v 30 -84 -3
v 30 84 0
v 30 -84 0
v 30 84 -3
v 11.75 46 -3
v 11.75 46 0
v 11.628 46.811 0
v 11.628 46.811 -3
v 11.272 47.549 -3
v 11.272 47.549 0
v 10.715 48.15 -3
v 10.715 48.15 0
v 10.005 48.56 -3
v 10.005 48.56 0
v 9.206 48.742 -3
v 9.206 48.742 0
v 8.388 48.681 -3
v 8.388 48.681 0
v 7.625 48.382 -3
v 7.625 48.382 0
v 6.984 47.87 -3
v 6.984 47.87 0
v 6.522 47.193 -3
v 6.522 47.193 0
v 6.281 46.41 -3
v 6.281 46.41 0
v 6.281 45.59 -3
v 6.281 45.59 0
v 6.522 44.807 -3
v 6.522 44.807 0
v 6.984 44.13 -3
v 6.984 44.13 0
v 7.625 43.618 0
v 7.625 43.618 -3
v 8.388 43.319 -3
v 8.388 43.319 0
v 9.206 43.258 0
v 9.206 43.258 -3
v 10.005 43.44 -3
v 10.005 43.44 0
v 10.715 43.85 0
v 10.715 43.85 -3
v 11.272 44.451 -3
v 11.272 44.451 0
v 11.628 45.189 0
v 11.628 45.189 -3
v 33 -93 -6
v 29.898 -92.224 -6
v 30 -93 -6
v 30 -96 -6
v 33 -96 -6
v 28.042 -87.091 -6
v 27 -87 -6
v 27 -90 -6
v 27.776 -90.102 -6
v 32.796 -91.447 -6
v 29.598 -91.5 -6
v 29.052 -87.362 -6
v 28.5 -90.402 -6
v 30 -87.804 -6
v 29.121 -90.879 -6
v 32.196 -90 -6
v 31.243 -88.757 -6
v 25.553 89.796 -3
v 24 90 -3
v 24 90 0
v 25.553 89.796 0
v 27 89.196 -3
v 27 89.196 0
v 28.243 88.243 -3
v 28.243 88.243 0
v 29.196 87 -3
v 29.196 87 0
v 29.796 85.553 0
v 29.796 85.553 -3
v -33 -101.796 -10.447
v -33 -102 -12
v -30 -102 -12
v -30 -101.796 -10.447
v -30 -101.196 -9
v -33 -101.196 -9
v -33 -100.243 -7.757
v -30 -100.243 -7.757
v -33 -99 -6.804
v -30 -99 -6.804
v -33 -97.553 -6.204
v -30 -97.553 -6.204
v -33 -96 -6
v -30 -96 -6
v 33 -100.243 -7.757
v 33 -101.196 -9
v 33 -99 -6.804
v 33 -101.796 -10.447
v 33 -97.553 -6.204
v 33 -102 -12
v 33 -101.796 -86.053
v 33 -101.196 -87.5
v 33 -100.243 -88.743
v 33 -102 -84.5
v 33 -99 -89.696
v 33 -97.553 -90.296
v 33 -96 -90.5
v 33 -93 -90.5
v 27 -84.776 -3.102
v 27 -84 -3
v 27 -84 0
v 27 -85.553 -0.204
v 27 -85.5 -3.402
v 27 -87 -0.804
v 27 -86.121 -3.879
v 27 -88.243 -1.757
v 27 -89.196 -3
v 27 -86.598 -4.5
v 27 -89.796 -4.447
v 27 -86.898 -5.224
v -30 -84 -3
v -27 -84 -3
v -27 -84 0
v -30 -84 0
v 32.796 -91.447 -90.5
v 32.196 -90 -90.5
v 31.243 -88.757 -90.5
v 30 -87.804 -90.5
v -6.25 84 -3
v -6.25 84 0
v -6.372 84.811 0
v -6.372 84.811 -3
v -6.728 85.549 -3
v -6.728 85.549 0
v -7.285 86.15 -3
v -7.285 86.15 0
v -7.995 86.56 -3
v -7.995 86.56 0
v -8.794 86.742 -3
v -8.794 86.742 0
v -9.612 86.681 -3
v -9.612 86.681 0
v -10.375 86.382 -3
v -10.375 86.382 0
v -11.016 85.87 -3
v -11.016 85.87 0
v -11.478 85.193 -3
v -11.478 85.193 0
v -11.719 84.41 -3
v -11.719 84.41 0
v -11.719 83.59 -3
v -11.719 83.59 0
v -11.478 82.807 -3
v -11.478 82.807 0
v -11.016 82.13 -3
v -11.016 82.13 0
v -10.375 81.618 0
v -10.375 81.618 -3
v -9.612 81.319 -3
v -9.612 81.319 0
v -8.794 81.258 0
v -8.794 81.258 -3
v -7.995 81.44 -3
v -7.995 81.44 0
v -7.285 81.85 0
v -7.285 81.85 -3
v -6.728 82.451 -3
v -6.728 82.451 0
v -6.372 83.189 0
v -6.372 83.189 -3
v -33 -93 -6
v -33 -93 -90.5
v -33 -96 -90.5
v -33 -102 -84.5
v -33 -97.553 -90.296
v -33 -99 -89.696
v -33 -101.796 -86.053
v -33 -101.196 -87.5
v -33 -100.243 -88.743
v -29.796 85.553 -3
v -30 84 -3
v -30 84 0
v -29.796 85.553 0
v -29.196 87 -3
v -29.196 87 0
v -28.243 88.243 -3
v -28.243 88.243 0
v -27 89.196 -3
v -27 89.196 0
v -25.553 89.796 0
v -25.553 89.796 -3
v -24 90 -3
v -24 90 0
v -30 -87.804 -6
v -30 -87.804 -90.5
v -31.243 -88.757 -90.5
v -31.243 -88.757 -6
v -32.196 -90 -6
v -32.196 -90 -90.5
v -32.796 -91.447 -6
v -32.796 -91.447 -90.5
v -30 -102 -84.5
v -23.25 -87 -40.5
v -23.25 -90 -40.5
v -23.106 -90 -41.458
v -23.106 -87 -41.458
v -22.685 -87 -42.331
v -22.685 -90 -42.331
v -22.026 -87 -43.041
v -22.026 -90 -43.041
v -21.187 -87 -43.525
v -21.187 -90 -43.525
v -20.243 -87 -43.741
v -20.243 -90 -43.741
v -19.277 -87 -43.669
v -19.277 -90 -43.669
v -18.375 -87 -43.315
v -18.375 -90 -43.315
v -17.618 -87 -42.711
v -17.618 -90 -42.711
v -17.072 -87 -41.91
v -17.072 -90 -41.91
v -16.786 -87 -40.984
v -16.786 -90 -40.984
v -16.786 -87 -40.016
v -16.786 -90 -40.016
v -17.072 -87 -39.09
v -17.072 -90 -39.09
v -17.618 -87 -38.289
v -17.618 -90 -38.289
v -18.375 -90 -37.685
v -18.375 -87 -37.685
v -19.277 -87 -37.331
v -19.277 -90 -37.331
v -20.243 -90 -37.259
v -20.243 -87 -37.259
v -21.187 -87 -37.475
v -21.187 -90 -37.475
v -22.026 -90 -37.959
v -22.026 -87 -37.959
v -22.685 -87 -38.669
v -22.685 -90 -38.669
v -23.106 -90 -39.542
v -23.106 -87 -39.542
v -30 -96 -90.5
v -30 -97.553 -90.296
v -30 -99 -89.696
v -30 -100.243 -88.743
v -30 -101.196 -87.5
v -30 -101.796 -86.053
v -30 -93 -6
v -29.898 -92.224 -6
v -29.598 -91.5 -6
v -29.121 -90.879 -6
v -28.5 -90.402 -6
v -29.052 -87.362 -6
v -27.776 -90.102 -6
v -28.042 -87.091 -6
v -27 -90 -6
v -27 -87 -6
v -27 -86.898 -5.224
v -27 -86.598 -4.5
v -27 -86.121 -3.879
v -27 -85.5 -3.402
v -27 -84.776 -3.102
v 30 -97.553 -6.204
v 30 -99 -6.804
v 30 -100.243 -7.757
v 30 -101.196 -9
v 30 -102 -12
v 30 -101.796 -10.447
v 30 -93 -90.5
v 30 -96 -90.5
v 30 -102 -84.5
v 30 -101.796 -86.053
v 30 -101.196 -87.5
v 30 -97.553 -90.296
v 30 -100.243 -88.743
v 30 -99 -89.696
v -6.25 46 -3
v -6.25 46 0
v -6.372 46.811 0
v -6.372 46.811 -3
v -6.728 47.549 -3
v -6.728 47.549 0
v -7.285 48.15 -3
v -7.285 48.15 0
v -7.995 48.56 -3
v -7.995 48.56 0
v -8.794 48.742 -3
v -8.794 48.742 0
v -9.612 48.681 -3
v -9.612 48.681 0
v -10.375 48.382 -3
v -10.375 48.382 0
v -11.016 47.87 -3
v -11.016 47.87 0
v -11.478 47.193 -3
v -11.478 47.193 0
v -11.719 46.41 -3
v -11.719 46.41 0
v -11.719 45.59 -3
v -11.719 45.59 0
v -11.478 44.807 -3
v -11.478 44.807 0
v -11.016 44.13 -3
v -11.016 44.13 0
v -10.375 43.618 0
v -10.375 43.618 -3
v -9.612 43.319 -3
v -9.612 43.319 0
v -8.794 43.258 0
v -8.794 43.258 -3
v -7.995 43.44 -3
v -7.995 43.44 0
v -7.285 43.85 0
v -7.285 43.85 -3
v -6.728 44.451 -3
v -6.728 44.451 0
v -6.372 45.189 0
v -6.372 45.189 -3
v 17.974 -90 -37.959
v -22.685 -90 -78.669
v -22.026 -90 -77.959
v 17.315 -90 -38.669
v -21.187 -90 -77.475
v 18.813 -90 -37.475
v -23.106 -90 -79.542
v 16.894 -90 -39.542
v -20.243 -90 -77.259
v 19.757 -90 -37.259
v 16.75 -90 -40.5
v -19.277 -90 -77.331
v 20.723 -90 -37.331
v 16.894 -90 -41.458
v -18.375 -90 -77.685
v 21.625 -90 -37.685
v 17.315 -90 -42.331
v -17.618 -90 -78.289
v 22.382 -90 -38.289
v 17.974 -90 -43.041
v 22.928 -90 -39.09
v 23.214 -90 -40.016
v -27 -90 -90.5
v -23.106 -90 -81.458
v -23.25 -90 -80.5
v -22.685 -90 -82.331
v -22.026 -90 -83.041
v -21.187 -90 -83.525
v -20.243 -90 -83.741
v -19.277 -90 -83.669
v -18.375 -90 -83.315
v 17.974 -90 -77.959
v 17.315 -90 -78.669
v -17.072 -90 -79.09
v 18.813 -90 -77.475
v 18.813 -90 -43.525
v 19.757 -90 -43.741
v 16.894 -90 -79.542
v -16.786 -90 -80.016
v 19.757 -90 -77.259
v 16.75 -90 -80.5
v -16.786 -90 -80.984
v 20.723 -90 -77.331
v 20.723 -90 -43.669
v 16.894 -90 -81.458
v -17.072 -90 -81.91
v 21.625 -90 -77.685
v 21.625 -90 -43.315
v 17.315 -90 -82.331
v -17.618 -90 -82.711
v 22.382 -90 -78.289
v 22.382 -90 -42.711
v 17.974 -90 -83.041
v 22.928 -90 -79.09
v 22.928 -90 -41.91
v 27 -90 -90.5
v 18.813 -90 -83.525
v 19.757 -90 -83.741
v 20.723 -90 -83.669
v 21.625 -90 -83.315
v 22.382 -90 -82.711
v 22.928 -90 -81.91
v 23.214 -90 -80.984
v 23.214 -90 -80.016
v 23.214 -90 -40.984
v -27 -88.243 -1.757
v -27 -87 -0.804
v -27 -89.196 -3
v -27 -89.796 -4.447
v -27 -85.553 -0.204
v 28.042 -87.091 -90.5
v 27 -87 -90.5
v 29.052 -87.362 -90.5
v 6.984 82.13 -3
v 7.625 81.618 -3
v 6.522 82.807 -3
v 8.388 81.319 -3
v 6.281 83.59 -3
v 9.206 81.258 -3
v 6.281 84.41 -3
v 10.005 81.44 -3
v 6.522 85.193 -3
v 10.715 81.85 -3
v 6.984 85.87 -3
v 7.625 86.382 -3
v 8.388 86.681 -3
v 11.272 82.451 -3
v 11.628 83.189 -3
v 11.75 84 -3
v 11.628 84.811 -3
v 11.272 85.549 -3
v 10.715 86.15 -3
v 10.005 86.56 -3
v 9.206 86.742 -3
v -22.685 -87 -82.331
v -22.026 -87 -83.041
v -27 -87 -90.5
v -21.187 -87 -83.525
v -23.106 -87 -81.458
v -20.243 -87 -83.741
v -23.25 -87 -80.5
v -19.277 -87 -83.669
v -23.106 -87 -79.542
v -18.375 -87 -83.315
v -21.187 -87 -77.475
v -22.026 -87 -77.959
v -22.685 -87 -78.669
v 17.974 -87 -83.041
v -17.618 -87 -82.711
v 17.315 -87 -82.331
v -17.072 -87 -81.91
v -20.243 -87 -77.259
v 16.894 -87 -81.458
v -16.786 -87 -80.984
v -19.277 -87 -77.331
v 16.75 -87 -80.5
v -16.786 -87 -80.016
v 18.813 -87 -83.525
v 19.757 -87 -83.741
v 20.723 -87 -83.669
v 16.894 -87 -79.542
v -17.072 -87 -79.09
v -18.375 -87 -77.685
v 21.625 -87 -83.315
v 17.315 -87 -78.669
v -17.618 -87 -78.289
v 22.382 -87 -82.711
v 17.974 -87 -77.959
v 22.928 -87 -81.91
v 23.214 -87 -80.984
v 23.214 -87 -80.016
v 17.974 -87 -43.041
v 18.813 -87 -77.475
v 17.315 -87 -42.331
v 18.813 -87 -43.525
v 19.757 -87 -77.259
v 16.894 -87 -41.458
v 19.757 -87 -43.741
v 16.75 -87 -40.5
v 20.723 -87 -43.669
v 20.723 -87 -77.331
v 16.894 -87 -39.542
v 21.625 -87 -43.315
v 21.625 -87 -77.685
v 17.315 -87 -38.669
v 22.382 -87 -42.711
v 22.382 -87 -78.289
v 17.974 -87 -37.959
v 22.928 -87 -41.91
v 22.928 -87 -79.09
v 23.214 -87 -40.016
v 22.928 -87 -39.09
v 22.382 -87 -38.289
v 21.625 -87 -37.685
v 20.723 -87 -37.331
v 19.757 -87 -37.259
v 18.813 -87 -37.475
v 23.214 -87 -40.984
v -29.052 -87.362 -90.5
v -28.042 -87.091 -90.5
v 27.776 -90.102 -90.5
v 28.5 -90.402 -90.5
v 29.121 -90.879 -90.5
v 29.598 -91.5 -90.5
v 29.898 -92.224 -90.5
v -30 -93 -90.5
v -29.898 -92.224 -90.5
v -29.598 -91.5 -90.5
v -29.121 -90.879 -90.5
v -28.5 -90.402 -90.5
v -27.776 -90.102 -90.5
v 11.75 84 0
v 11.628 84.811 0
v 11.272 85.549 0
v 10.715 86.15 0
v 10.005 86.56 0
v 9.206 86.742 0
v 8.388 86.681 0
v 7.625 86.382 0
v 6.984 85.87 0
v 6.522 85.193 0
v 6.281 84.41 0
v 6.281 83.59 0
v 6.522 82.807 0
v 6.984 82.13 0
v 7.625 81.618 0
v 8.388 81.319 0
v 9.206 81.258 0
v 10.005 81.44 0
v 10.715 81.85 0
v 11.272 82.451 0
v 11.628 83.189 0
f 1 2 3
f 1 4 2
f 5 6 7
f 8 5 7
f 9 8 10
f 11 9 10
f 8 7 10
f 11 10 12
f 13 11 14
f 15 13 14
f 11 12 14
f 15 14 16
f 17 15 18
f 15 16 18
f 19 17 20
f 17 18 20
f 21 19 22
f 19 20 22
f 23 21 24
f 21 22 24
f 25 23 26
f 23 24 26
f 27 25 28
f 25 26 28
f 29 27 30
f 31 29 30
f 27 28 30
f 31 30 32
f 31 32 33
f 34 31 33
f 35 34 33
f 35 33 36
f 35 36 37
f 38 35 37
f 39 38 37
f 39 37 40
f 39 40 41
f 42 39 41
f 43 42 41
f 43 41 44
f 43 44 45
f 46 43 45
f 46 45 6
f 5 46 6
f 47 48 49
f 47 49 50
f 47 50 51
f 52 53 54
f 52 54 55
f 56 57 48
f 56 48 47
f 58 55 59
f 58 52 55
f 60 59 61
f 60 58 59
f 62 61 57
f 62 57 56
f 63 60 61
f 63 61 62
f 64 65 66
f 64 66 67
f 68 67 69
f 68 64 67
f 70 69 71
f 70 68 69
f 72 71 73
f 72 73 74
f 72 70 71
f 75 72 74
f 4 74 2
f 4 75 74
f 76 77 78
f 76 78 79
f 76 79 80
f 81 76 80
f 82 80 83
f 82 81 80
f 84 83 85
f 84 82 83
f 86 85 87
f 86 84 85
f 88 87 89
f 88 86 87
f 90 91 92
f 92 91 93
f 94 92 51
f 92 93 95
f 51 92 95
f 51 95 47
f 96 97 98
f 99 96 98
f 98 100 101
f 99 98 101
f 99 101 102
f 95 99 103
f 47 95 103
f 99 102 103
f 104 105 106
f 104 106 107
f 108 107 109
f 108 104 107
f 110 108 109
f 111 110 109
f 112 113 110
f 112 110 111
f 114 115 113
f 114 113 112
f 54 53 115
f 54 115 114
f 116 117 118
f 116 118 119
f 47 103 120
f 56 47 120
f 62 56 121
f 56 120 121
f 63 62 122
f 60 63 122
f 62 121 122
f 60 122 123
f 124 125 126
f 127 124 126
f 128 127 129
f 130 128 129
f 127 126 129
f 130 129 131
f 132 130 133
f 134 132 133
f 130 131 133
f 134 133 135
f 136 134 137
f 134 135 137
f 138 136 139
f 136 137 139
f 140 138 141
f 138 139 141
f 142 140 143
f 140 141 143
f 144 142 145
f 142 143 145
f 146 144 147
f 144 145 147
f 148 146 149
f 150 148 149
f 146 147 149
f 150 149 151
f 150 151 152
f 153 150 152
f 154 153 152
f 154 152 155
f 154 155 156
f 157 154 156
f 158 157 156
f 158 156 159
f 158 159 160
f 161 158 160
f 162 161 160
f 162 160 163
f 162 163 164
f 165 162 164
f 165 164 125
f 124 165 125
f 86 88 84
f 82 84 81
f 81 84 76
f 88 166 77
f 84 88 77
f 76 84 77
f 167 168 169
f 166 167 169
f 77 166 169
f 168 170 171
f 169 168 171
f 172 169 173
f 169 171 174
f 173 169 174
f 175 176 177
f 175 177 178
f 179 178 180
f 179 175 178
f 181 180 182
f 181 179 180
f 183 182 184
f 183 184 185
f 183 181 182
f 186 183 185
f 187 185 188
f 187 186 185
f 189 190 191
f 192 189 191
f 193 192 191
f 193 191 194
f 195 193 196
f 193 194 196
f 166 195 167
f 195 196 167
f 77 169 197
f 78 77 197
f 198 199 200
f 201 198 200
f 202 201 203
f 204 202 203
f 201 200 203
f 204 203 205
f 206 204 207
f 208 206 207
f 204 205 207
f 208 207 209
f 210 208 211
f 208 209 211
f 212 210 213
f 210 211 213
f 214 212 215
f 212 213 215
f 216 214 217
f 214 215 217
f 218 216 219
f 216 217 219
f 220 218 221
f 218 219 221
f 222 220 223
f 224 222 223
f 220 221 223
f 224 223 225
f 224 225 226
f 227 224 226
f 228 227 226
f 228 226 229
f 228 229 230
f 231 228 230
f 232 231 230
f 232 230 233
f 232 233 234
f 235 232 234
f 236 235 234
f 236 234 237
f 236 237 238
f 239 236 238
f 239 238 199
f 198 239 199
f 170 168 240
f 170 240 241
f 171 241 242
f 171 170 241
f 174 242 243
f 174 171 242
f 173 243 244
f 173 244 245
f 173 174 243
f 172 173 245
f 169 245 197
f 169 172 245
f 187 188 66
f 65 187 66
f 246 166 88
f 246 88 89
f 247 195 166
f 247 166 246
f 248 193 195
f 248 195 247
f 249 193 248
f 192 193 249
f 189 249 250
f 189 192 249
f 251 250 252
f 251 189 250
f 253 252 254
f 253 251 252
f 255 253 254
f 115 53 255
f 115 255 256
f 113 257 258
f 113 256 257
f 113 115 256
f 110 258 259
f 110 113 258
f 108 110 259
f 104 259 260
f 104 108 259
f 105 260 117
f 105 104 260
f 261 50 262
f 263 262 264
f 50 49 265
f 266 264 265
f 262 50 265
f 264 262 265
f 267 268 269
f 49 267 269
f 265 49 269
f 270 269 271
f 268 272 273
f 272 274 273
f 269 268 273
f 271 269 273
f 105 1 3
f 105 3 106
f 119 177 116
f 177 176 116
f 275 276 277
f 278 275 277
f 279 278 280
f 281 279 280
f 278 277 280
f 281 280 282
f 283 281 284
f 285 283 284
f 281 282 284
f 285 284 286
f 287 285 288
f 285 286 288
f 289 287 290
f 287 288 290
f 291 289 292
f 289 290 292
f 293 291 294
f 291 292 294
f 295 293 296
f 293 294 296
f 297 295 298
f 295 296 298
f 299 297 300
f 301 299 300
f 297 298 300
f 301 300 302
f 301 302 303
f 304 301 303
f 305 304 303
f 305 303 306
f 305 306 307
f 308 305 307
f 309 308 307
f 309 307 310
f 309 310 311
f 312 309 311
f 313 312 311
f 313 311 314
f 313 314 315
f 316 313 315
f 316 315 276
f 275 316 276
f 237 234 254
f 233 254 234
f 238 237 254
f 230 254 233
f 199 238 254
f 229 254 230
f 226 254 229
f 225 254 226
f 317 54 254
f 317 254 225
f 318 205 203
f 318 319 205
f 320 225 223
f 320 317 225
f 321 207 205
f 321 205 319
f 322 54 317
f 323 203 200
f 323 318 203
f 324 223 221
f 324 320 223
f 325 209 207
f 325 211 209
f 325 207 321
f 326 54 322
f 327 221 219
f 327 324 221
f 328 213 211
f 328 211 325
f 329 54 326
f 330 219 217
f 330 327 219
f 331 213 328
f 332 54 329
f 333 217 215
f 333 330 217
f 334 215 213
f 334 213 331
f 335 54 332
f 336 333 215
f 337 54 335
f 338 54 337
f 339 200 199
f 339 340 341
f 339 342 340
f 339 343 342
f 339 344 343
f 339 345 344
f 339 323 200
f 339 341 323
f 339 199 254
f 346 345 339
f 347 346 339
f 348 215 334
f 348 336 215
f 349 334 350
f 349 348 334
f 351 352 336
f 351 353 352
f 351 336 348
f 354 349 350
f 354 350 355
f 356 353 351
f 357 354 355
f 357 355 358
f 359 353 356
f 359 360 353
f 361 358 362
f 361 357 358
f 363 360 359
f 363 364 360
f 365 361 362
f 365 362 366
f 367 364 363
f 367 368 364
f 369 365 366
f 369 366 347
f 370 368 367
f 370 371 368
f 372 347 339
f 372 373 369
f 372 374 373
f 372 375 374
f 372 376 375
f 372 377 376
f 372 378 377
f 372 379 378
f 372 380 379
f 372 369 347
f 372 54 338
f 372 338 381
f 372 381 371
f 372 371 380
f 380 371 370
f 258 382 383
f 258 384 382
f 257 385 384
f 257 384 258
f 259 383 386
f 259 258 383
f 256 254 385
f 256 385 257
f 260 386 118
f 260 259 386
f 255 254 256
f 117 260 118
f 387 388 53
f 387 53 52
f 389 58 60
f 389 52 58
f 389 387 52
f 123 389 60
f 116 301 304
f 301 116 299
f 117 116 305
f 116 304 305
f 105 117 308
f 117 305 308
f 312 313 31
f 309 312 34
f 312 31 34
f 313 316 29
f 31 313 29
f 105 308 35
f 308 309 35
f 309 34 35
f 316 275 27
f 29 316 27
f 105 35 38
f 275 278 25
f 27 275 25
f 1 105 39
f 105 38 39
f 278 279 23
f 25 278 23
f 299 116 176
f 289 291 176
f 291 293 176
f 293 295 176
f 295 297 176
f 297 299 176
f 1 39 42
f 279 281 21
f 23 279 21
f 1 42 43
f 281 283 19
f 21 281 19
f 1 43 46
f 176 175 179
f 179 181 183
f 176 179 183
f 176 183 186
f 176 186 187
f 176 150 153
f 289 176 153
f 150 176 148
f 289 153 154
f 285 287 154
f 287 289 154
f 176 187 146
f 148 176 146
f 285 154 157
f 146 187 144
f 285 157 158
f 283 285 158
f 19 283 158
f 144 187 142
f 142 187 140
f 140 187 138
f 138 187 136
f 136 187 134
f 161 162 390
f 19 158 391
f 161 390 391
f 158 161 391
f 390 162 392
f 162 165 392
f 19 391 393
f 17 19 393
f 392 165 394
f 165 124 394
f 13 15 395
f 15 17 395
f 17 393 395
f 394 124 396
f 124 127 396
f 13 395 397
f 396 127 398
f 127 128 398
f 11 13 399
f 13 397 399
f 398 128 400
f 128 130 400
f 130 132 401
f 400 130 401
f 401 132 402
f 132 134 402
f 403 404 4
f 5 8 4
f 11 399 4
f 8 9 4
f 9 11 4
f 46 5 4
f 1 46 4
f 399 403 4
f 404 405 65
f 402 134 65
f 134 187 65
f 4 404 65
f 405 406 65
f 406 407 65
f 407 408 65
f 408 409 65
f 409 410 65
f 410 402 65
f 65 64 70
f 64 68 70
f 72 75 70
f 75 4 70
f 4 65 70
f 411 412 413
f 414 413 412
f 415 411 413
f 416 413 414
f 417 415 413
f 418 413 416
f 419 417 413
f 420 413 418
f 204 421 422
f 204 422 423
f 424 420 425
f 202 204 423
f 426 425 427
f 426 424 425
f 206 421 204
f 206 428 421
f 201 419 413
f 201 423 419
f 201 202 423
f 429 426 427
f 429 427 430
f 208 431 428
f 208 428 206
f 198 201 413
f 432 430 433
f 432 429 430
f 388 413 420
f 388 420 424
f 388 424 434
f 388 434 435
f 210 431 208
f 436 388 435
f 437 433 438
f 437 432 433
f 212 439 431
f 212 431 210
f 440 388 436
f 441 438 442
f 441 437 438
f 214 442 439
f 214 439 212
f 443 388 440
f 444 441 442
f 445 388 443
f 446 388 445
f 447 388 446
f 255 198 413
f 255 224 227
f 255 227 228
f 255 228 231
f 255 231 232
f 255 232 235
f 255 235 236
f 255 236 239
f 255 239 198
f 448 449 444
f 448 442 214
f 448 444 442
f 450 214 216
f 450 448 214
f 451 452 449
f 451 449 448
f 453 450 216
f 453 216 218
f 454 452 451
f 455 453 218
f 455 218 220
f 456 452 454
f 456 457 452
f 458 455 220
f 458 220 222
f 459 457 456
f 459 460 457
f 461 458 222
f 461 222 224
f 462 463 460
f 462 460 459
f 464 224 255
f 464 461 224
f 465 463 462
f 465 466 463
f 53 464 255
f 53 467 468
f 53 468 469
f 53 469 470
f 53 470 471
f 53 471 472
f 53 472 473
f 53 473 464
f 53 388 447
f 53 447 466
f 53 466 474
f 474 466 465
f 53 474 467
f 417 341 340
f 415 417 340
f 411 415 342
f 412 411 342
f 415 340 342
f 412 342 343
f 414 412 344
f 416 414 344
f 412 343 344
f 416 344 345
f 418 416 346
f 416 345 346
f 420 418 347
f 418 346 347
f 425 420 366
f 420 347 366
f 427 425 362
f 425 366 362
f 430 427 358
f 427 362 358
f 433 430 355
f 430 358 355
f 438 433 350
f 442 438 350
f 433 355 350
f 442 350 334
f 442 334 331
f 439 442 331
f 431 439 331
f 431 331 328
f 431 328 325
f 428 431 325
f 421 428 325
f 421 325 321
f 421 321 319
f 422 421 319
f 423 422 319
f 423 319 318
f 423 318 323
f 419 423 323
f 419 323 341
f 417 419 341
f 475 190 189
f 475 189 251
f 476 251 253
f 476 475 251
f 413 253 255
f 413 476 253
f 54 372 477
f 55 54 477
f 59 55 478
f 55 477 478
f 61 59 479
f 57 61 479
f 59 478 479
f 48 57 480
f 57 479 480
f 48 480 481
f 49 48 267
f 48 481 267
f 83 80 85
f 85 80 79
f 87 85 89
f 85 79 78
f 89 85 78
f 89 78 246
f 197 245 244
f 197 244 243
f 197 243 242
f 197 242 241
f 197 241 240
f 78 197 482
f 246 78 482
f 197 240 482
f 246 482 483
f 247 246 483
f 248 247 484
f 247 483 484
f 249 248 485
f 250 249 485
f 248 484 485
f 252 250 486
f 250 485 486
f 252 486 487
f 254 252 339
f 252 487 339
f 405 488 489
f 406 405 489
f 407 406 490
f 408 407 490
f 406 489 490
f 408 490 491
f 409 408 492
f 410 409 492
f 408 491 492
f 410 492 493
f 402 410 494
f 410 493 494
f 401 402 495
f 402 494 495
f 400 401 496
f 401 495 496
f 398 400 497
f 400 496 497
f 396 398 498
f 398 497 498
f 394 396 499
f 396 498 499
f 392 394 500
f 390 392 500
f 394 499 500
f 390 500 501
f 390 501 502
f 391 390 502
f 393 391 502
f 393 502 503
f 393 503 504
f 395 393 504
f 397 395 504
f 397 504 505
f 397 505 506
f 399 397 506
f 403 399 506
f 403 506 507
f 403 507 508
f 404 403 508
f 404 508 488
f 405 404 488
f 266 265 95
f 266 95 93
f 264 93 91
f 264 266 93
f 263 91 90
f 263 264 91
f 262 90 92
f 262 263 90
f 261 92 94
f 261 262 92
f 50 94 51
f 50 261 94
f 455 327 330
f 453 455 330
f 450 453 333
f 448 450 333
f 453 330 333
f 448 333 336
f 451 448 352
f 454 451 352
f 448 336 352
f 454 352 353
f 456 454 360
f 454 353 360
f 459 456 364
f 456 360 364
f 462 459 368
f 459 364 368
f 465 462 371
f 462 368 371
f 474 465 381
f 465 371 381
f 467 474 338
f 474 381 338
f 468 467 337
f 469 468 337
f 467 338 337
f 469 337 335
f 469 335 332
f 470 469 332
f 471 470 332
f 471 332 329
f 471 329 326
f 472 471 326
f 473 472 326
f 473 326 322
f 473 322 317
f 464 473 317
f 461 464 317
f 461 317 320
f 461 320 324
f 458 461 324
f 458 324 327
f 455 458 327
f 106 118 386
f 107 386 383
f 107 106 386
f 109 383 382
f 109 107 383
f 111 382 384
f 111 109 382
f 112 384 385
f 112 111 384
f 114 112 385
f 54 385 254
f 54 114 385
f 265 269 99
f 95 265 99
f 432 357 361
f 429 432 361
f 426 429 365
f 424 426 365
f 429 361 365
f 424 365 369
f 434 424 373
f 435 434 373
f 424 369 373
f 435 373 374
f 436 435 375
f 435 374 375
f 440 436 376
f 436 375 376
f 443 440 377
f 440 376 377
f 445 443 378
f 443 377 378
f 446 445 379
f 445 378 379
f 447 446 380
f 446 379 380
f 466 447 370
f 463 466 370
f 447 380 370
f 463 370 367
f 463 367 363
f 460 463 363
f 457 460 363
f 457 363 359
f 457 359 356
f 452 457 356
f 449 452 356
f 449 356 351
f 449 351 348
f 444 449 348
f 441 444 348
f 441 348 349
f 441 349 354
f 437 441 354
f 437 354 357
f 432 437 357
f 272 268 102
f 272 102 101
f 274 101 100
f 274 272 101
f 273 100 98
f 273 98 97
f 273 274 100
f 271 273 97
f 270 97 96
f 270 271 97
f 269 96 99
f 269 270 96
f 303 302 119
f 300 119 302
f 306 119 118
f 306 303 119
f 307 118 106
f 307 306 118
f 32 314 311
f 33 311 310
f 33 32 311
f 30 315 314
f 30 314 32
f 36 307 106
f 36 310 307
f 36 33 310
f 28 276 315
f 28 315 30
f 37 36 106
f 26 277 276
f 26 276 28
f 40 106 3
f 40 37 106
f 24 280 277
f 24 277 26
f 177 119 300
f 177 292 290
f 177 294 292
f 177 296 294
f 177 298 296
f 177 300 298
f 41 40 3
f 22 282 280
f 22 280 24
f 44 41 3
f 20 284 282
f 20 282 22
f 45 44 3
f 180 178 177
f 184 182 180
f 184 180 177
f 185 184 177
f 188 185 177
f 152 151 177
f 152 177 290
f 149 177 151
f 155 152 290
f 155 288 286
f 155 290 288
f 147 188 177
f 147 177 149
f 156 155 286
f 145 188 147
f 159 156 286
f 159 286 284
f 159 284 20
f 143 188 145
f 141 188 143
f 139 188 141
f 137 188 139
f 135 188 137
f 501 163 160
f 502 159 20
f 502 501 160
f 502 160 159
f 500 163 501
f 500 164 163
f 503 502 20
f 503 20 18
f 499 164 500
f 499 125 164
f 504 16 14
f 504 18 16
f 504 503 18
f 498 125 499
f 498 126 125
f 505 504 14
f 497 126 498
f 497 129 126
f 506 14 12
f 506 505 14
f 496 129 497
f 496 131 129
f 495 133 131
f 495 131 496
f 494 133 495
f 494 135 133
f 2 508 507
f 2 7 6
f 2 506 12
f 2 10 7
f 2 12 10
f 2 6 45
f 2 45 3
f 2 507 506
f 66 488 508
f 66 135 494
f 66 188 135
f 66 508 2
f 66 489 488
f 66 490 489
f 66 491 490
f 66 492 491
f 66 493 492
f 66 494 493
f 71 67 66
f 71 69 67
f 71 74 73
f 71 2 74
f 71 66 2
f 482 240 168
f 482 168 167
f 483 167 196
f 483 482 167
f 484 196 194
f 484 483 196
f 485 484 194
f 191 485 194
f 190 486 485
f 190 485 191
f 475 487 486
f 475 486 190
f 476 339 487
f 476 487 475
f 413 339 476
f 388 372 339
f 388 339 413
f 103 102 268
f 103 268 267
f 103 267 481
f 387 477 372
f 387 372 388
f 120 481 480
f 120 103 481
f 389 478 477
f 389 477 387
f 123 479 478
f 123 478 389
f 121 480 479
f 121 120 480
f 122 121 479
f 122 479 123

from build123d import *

# Parameters (mm, degrees)
SKIZZE1_W                        = 60
SKIZZE1_H                        = 180
BASIS_BLECH1_DEPTH               = 3
KANTE_LASCHE1_STRIP_W            = 18
KANTE_LASCHE1_STRIP_H            = 3
KANTE_LASCHE1_STRIP_CUT_DEPTH    = 60
KANTE_LASCHE1_DEPTH              = 60
KANTE_LASCHE2_START              = -90.5
KANTE_LASCHE2_DEPTH              = 90.5
KANTE_LASCHE2_START_2            = -6
KANTE_LASCHE2_2_DEPTH            = 6
KANTE_LASCHE2_3_DEPTH            = 84.5
ECKE_START                       = -33
ECKE_BRECHEN1_DEPTH              = 66
ECKE_START_2                     = -3
ECKE_BRECHEN1_2_DEPTH            = 3
F_6_5_6_5_DURCHMESSER_BOHRUNG1_D = 6.5
F_5_5_5_5_DURCHMESSER_BOHRUNG1_D = 5.5


# Read off the part's stored shape, not the designer's step: Kante-Lasche2, Ecke brechen1
# Sheet-metal steps are written as plain solids
with BuildPart() as part:
    # Skizze1 → Basis-Blech1 (new body)
    with BuildSketch(Plane.XY):
        Rectangle(SKIZZE1_W, SKIZZE1_H)
    extrude(amount=-BASIS_BLECH1_DEPTH)

    # Kante-Lasche1 strip (across the edge) → Kante-Lasche1 strip cut (cut)
    with BuildSketch(Plane(origin=(30, -90, -3), x_dir=(0, 1, 0), z_dir=(-1, 0, 0))):
        with Locations((-3, -1.5)):
            Rectangle(KANTE_LASCHE1_STRIP_W, KANTE_LASCHE1_STRIP_H)
    extrude(amount=KANTE_LASCHE1_STRIP_CUT_DEPTH, mode=Mode.SUBTRACT)

    # Kante-Lasche1 section (across the edge) → Kante-Lasche1 (add)
    with BuildSketch(Plane(origin=(30, -90, -3), x_dir=(0, 1, 0), z_dir=(-1, 0, 0))):
        with BuildLine():
            Line((0, 3), (0, 87.5))
            Line((0, 87.5), (3, 87.5))
            Line((3, 87.5), (3, 3))
            ThreePointArc((3, 3), (3.878679656, 0.878679656), (6, 0))
            Line((6, 0), (6, -3))
            ThreePointArc((6, -3), (1.757359313, -1.242640687), (0, 3))
        make_face()
    extrude(amount=KANTE_LASCHE1_DEPTH)

    # Kante-Lasche2 outline → Kante-Lasche2 (cut)
    with BuildSketch(Plane.XY.offset(KANTE_LASCHE2_START)):
        with BuildLine():
            Line((-27, -87), (-27, -84))
            Line((-27, -84), (-30, -84))
            Line((-30, -84), (-30, -87.803847577))
            ThreePointArc((-30, -87.803847577), (-28.552914271, -87.204445042), (-27, -87))
        make_face()
        with BuildLine():
            Line((30, -84), (27, -84))
            Line((27, -84), (27, -87))
            ThreePointArc((27, -87), (28.552914271, -87.204445042), (30, -87.803847577))
            Line((30, -87.803847577), (30, -84))
        make_face()
    extrude(amount=KANTE_LASCHE2_DEPTH, mode=Mode.SUBTRACT)

    # Kante-Lasche2 2 outline → Kante-Lasche2 2 (cut)
    with BuildSketch(Plane.XY.offset(KANTE_LASCHE2_START_2)):
        with BuildLine():
            Line((-27, -90), (-27, -87))
            ThreePointArc((-27, -87), (-28.552914271, -87.204445042), (-30, -87.803847577))
            ThreePointArc((-30, -87.803847577), (-32.196152423, -90), (-33, -93))
            Line((-33, -93), (-33, -102))
            Line((-33, -102), (-30, -102))
            Line((-30, -102), (-30, -93))
            ThreePointArc((-30, -93), (-29.121320344, -90.878679656), (-27, -90))
        make_face()
        with BuildLine():
            ThreePointArc((30, -87.803847577), (28.552914271, -87.204445042), (27, -87))
            Line((27, -87), (27, -90))
            ThreePointArc((27, -90), (29.121320344, -90.878679656), (30, -93))
            Line((30, -93), (30, -102))
            Line((30, -102), (33, -102))
            Line((33, -102), (33, -93))
            ThreePointArc((33, -93), (32.196152423, -90), (30, -87.803847577))
        make_face()
    extrude(amount=KANTE_LASCHE2_2_DEPTH, mode=Mode.SUBTRACT)

    # Kante-Lasche2 3 outline → Kante-Lasche2 3 (add)
    with BuildSketch(Plane.XY.offset(KANTE_LASCHE2_START)):
        with BuildLine():
            Line((-27, -90), (-27, -87))
            ThreePointArc((-27, -87), (-28.552914271, -87.204445042), (-30, -87.803847577))
            ThreePointArc((-30, -87.803847577), (-32.196152423, -90), (-33, -93))
            Line((-33, -93), (-33, -102))
            Line((-33, -102), (-30, -102))
            Line((-30, -102), (-30, -93))
            ThreePointArc((-30, -93), (-29.121320344, -90.878679656), (-27, -90))
        make_face()
        with BuildLine():
            ThreePointArc((30, -87.803847577), (28.552914271, -87.204445042), (27, -87))
            Line((27, -87), (27, -90))
            ThreePointArc((27, -90), (29.121320344, -90.878679656), (30, -93))
            Line((30, -93), (30, -102))
            Line((30, -102), (33, -102))
            Line((33, -102), (33, -93))
            ThreePointArc((33, -93), (32.196152423, -90), (30, -87.803847577))
        make_face()
    extrude(amount=KANTE_LASCHE2_3_DEPTH)

    # Ecke brechen1 outline → Ecke brechen1 (cut)
    with BuildSketch(Plane.YZ.offset(ECKE_START)):
        with BuildLine():
            ThreePointArc((-96, -90.5), (-100.242640687, -88.742640687), (-102, -84.5))
            Line((-102, -84.5), (-102, -90.5))
            Line((-102, -90.5), (-96, -90.5))
        make_face()
        with BuildLine():
            ThreePointArc((-102, -12), (-100.242640687, -7.757359313), (-96, -6))
            Line((-96, -6), (-102, -6))
            Line((-102, -6), (-102, -12))
        make_face()
    extrude(amount=ECKE_BRECHEN1_DEPTH, mode=Mode.SUBTRACT)

    # Ecke brechen1 2 outline → Ecke brechen1 2 (cut)
    with BuildSketch(Plane.XY.offset(ECKE_START_2)):
        with BuildLine():
            Line((30, 90), (24, 90))
            ThreePointArc((24, 90), (28.242640687, 88.242640687), (30, 84))
            Line((30, 84), (30, 90))
        make_face()
        with BuildLine():
            ThreePointArc((-30, 84), (-28.242640687, 88.242640687), (-24, 90))
            Line((-24, 90), (-30, 90))
            Line((-30, 90), (-30, 84))
        make_face()
    extrude(amount=ECKE_BRECHEN1_2_DEPTH, mode=Mode.SUBTRACT)

    # Ø6.5 (6.5) Durchmesser Bohrung1 (through all)
    with Locations(Plane(origin=(0, -87, 0), x_dir=(1, 0, 0), z_dir=(0, 1, 0))):
        with Locations((-20, 80.5), (20, 80.5), (-20, 40.5), (20, 40.5)):
            Hole(F_6_5_6_5_DURCHMESSER_BOHRUNG1_D / 2)

    # Ø5.5 (5.5) Durchmesser Bohrung1 (through all)
    with Locations(Plane(origin=(0, 0, -3), x_dir=(-1, 0, 0), z_dir=(0, 0, -1))):
        with Locations((-9, 84), (9, 84), (-9, 46), (9, 46)):
            Hole(F_5_5_5_5_DURCHMESSER_BOHRUNG1_D / 2)


solid = part.part
